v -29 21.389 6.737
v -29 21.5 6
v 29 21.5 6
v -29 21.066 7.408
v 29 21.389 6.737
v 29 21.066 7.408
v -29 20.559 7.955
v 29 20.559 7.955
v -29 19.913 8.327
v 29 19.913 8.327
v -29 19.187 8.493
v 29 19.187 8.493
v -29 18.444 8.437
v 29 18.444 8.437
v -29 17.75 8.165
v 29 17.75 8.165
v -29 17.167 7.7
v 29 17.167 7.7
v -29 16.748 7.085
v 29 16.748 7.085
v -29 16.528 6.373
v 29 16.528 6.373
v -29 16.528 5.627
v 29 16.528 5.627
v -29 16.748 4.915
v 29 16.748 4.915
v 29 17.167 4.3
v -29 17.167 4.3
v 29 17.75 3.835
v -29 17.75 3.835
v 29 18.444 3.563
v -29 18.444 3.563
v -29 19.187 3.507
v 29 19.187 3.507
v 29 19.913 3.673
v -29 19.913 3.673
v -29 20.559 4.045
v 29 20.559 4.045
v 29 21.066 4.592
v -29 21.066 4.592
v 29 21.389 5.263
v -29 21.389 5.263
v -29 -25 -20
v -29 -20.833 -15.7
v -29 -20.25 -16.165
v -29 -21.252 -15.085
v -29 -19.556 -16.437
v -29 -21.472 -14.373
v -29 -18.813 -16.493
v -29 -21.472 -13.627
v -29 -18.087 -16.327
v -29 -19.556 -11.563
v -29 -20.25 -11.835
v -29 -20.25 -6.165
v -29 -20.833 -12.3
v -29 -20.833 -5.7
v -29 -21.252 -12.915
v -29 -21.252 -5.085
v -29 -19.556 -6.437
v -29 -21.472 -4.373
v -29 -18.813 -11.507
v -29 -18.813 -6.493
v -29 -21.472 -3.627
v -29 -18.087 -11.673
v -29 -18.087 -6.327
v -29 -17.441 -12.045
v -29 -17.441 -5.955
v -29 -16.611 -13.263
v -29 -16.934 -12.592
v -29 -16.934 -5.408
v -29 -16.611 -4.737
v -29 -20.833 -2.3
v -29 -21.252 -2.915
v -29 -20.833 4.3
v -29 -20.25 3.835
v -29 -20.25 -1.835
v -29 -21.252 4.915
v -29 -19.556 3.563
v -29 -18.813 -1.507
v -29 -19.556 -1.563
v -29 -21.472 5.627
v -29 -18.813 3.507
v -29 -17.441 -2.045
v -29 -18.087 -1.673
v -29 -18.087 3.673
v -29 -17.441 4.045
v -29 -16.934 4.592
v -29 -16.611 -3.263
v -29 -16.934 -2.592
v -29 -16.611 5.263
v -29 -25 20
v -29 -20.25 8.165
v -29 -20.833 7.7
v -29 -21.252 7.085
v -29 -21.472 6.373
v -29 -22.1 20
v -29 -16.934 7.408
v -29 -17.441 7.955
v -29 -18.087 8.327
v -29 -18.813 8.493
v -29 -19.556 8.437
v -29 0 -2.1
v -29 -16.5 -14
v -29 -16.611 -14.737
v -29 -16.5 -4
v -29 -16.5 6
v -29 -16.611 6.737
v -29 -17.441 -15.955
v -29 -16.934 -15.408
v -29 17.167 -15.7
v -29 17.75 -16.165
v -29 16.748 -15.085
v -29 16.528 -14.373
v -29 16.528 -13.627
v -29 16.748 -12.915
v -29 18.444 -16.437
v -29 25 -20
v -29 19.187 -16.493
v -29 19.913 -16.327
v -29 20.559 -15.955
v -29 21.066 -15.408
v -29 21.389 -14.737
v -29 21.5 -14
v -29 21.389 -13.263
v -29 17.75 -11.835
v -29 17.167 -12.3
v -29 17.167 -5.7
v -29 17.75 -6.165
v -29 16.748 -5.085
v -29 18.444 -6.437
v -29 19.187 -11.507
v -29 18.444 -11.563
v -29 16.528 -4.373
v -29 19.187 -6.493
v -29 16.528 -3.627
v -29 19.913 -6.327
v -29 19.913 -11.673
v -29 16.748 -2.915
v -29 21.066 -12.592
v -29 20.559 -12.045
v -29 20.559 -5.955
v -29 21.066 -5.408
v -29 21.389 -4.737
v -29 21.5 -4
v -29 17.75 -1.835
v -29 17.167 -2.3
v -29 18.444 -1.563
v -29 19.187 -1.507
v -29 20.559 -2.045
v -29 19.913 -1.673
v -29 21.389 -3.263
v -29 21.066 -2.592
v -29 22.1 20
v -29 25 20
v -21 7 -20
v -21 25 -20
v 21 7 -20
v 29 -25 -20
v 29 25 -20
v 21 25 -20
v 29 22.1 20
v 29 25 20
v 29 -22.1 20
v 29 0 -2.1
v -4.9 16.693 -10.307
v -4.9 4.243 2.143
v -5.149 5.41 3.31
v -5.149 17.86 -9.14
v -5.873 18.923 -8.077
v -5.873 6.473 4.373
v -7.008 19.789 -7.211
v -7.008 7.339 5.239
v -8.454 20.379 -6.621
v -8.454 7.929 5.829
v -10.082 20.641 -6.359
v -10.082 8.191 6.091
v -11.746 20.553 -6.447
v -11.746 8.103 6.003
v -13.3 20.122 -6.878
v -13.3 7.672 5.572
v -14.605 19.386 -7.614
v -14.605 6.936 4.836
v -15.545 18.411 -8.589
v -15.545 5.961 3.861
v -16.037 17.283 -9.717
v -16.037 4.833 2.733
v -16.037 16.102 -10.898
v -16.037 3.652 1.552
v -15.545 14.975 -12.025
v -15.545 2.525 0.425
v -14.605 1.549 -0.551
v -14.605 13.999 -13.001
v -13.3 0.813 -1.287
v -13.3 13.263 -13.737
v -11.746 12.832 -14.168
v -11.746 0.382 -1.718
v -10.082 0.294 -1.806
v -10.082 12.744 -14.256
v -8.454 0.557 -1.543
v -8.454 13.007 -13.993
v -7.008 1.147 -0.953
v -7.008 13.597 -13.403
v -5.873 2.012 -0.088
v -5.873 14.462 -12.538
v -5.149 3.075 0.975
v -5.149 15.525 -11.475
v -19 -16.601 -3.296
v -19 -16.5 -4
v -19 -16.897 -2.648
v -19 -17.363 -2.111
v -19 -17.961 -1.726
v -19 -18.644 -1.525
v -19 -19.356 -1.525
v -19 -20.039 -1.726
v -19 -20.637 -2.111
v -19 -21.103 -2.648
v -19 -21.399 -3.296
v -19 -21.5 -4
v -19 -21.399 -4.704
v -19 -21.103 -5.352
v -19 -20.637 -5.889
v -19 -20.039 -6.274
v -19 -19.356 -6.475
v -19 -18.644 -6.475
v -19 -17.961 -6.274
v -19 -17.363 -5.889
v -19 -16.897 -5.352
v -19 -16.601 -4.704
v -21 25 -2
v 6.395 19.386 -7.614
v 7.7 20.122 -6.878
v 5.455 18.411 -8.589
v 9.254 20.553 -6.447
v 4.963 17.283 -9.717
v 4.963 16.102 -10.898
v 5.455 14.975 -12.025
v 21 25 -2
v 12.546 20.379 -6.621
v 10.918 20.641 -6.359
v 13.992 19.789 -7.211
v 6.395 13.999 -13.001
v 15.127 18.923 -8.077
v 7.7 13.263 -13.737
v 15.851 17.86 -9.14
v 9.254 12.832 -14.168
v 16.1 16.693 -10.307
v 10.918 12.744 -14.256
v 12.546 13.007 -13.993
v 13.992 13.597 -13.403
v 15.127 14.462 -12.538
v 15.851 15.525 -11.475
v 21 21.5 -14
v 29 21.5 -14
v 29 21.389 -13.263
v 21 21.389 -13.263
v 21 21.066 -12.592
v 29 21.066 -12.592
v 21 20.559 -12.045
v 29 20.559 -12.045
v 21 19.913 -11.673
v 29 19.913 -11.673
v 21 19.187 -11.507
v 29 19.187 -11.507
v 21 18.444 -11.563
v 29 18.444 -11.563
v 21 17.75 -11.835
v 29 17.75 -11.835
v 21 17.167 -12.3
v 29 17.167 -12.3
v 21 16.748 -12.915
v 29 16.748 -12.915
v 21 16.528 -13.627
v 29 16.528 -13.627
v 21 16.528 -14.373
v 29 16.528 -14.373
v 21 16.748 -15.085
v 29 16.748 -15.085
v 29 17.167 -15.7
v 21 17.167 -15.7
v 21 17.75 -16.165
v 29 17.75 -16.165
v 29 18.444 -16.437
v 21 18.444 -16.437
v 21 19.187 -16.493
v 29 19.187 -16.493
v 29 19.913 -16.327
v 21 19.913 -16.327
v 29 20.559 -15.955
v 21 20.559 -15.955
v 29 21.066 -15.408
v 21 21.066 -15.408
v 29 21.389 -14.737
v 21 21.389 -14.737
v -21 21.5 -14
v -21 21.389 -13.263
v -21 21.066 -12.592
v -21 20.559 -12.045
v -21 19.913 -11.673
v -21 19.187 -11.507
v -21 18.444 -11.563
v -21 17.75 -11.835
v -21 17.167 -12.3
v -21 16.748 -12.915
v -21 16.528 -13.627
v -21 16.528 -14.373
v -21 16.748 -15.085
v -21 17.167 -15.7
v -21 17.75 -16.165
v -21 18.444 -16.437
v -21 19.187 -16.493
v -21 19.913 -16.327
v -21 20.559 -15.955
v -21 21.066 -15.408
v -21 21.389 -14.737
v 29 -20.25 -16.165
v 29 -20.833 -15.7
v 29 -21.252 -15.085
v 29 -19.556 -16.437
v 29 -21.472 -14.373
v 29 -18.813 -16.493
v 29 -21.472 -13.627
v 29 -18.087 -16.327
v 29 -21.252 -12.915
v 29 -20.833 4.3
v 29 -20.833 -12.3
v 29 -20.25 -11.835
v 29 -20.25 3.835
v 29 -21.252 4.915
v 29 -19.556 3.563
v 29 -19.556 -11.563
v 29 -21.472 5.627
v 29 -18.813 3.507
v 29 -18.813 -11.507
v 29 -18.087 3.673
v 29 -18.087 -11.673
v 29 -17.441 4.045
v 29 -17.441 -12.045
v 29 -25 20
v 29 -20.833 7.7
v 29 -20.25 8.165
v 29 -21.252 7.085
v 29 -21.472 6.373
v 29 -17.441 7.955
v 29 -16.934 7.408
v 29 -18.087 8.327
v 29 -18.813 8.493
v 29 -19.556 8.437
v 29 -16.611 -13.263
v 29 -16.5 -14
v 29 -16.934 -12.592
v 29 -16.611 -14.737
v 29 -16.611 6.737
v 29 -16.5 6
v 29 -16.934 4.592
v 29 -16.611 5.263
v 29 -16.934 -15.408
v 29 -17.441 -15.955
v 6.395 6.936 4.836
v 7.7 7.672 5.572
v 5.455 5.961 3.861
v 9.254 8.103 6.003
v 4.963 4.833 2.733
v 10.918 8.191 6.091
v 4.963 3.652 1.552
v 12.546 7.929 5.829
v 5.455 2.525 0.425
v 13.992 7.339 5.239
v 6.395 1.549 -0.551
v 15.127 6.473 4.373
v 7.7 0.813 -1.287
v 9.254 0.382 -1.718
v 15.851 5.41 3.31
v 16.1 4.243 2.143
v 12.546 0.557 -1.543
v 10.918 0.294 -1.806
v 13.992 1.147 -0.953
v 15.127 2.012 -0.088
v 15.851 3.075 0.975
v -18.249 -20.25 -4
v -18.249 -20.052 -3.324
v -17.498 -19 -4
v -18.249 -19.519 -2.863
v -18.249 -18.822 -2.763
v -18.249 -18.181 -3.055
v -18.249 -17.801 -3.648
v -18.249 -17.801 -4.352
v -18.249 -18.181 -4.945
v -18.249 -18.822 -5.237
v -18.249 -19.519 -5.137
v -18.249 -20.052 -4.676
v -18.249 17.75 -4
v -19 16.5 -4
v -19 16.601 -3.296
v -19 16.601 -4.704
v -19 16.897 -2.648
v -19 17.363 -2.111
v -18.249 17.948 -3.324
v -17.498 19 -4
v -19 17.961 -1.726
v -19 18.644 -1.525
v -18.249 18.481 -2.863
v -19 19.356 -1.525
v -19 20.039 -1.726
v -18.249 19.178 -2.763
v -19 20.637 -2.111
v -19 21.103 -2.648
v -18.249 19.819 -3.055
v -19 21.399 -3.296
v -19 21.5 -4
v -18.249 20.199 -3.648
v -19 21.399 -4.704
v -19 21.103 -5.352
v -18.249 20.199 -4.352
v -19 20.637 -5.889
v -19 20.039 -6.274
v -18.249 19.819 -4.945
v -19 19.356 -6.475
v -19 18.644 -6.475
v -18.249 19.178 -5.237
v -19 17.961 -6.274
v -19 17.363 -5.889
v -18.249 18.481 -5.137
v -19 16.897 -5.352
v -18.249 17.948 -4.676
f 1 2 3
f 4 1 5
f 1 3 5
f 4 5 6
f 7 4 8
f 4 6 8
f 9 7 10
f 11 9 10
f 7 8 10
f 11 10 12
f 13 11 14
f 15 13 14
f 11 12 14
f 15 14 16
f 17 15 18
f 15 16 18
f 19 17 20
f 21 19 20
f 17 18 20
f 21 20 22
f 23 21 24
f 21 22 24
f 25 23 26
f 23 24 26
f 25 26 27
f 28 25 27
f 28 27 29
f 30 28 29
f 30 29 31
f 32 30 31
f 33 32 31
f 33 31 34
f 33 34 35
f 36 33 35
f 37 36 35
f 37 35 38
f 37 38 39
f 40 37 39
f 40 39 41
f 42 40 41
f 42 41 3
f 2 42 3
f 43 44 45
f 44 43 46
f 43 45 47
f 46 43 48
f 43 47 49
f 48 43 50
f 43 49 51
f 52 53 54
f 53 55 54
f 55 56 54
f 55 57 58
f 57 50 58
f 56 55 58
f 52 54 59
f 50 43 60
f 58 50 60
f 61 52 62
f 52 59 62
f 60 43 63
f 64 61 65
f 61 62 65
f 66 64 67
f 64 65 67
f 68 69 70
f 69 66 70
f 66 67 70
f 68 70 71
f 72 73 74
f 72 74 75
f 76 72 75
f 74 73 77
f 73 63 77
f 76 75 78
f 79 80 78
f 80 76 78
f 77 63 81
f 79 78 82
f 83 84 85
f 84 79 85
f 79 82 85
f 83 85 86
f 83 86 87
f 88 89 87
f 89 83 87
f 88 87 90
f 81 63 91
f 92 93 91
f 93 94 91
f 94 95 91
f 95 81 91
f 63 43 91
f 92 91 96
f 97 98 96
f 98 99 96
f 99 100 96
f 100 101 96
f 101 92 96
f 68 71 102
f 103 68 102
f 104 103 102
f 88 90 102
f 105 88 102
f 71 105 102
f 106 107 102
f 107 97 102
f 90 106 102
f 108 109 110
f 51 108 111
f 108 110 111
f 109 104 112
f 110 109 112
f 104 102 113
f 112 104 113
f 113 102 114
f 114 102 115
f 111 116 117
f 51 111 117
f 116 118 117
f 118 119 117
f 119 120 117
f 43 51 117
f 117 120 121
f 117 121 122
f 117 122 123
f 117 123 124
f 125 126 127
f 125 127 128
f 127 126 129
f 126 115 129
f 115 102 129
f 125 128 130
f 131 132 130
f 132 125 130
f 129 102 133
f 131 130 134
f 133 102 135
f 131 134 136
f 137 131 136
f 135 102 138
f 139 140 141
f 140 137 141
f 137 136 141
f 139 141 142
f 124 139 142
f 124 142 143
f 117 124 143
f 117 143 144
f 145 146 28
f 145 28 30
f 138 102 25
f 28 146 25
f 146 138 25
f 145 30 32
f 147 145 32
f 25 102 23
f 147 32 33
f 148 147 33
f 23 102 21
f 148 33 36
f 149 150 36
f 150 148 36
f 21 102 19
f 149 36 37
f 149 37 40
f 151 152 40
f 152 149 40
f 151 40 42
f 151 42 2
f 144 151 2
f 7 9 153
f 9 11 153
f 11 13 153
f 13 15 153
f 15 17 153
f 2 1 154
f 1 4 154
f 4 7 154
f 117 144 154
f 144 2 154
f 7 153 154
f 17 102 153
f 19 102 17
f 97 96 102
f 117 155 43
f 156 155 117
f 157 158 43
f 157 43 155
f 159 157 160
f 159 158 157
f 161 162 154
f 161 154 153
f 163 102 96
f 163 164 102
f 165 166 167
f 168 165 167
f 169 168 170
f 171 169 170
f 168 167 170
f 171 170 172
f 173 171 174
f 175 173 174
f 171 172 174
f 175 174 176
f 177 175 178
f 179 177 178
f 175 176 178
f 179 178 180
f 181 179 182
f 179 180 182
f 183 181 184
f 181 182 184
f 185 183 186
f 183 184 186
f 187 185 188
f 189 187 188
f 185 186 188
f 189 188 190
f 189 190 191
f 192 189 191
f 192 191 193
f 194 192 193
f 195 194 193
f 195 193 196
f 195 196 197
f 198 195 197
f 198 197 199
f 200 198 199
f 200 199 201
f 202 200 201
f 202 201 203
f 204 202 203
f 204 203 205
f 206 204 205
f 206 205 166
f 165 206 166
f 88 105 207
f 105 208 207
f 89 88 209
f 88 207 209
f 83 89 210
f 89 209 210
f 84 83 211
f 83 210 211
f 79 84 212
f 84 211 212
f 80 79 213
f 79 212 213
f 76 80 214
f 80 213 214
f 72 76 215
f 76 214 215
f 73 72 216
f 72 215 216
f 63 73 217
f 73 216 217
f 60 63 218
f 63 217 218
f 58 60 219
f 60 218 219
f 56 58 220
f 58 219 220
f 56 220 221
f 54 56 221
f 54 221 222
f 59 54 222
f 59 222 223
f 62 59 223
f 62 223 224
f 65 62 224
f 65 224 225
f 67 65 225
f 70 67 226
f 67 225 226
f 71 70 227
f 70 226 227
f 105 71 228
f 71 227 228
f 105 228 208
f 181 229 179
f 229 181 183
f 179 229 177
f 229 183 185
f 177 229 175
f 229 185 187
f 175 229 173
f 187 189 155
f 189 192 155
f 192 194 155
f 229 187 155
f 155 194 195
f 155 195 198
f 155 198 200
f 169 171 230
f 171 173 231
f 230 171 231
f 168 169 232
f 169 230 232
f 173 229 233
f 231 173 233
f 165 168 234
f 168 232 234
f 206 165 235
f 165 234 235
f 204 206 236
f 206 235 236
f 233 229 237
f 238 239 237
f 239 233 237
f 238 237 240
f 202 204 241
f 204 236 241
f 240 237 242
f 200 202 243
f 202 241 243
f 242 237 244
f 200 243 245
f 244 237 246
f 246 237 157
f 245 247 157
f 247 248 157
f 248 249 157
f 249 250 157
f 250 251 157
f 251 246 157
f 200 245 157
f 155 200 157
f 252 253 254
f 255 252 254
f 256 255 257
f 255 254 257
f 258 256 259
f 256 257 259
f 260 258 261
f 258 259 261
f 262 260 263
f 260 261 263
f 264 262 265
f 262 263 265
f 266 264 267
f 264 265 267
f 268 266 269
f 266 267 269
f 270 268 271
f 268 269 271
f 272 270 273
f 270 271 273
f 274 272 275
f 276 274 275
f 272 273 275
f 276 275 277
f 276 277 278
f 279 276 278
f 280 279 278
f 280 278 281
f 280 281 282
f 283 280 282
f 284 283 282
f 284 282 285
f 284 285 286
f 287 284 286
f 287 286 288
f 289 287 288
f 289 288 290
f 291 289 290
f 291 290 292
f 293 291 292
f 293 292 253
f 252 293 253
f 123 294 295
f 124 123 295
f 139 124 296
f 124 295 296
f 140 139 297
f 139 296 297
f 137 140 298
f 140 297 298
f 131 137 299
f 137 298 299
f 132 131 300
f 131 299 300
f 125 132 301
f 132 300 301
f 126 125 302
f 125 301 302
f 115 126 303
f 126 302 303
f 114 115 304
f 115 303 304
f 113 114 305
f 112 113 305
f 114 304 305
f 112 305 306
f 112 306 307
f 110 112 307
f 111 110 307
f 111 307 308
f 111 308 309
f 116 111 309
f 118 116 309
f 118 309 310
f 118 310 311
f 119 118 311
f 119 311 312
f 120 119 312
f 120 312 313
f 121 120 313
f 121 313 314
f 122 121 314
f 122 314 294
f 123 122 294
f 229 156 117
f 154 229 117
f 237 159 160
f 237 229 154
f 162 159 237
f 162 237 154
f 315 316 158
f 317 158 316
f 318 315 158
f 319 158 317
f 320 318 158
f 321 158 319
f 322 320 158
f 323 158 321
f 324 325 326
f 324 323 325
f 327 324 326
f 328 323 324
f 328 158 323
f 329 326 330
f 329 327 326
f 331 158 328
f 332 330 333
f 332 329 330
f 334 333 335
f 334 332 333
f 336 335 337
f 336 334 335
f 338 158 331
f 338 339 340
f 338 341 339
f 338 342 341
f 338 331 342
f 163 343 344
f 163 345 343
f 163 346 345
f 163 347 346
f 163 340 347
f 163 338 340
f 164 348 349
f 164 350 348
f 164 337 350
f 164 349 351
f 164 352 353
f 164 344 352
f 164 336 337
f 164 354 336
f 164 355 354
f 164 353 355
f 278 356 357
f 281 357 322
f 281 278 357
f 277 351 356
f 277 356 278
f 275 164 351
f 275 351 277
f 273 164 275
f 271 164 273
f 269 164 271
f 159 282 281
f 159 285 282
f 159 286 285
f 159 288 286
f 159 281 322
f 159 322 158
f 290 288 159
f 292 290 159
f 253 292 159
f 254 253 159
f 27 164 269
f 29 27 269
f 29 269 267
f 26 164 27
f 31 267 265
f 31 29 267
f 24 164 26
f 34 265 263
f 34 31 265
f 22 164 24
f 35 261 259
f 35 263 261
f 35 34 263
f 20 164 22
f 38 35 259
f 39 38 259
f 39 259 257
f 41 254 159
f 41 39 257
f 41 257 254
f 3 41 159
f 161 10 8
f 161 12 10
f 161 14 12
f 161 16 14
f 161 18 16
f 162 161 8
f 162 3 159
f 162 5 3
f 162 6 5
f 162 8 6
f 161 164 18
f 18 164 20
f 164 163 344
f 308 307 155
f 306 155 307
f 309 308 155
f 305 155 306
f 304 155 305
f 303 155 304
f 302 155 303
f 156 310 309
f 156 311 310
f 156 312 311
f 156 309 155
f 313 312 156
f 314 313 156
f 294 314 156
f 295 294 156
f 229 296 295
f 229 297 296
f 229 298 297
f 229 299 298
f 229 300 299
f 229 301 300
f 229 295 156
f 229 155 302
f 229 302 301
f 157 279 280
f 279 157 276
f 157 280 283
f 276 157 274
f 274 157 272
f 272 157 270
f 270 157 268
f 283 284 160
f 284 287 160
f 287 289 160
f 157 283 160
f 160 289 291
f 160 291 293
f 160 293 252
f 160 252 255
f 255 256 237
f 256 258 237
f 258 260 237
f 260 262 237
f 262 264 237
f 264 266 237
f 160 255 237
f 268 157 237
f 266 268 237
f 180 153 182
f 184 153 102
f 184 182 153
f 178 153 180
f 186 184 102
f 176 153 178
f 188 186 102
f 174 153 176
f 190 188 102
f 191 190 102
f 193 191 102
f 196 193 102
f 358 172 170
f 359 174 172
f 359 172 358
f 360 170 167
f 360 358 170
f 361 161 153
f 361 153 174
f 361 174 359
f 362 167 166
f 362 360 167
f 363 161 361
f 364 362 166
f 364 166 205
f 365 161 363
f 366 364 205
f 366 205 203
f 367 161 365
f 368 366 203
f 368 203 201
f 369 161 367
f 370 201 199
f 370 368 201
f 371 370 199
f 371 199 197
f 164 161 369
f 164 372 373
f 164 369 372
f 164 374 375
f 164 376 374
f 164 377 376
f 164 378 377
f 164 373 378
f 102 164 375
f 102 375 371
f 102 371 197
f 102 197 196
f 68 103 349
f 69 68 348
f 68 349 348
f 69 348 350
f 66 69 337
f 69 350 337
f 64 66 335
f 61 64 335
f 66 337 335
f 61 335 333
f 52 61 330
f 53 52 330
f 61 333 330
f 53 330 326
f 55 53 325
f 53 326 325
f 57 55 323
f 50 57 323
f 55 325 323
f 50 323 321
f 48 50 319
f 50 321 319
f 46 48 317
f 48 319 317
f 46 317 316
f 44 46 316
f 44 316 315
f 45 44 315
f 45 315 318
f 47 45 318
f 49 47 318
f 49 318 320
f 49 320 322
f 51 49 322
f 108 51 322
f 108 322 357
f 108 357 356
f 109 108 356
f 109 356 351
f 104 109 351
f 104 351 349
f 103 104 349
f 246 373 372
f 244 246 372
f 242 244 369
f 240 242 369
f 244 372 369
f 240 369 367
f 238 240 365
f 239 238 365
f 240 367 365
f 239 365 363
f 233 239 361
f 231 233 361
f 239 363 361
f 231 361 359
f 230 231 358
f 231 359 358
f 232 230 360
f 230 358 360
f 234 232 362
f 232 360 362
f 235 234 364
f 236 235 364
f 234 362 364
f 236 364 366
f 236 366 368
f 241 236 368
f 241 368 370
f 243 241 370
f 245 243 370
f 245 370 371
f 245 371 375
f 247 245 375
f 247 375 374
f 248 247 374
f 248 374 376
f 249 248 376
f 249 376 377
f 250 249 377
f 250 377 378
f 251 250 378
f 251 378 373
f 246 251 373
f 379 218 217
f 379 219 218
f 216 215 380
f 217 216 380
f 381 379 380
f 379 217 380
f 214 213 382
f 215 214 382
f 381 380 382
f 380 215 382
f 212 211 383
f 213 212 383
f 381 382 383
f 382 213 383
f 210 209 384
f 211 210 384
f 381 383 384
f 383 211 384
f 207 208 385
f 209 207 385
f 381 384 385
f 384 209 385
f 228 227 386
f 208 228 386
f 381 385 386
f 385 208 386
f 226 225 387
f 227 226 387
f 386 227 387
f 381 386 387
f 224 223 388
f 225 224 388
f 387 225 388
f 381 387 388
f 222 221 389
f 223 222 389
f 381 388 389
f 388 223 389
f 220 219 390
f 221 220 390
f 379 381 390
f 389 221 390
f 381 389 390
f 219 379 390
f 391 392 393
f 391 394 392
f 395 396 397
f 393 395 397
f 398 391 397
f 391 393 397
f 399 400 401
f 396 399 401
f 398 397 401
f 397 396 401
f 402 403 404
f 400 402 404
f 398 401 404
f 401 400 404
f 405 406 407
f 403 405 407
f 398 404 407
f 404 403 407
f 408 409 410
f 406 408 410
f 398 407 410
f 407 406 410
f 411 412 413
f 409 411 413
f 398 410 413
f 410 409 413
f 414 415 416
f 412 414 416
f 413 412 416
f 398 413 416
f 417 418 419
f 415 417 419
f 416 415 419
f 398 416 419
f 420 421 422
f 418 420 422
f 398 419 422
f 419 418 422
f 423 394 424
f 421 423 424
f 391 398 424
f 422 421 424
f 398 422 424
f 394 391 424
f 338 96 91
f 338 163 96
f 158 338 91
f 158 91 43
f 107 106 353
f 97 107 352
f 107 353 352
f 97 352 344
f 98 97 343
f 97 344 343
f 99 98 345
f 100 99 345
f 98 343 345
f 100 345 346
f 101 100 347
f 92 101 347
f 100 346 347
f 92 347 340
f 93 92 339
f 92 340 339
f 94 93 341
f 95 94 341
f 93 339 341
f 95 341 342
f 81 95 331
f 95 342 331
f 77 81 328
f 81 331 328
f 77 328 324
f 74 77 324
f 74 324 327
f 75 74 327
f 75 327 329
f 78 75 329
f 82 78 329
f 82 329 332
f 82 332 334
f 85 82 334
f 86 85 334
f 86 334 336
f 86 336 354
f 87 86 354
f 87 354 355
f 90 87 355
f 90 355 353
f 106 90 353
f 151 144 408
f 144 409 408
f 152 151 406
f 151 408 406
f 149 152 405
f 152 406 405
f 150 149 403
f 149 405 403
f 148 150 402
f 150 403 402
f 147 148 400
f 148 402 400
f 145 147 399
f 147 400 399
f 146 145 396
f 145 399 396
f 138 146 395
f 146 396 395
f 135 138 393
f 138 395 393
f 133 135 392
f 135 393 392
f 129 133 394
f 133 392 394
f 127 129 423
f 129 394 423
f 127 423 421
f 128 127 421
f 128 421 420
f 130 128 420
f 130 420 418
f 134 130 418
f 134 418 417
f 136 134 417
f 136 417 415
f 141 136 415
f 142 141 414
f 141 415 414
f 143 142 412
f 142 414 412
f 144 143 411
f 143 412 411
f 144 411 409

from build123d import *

# Parameters (mm, degrees)
F1_DEPTH = 29
F3_DEPTH = 21
F5_D     = 5
F6_D     = 5
F7_D     = 5
F7_DEPTH = 10
F7_TIP   = 1.5021515476
F9_D     = 11.2


with BuildPart() as f1:
    # F0 (on Right) → F1 (new body, symmetric)
    with BuildSketch(Plane.YZ):
        Polygon((-22.1, 20), (-25, 20), (-25, -20), (25, -20), (25, 20), (22.1, 20), (0, -2.1), align=None)
    extrude(amount=F1_DEPTH, both=True)

    # F2 (on Right) → F3 (cut, symmetric)
    with BuildSketch(Plane.YZ):
        Polygon((7, -20), (25, -20), (25, -2), align=None)
    extrude(amount=F3_DEPTH, both=True, mode=Mode.SUBTRACT)

    # F5 (through all)
    with Locations(Plane(origin=(-29, 0, 0), x_dir=(0, -1, 0), z_dir=(-1, 0, 0))):
        with Locations((-19, -14), (19, -14)):
            Hole(F5_D / 2)

    # F6 (through all)
    with Locations(Plane(origin=(-29, 0, 0), x_dir=(0, -1, 0), z_dir=(-1, 0, 0))):
        with Locations((-19, 6), (19, 6)):
            Hole(F6_D / 2)

    # F7
    with Locations(Plane(origin=(-29, 0, 0), x_dir=(0, -1, 0), z_dir=(-1, 0, 0))):
        with Locations((-19, -4), (19, -4)):
            Hole(F7_D / 2, depth=F7_DEPTH)
            with Locations((0, 0, -(F7_DEPTH + F7_TIP / 2))):  # 118° drill point
                Cone(0, F7_D / 2, F7_TIP, mode=Mode.SUBTRACT)

    # F9 (through all)
    with Locations(Plane(origin=(0, 13.5, -13.5), x_dir=(-1, 0, 0), z_dir=(0, 0.7071067812, -0.7071067812))):
        with Locations((-10.5, 4.5150757595), (10.5, 4.5150757595)):
            Hole(F9_D / 2)


solid = f1.part
